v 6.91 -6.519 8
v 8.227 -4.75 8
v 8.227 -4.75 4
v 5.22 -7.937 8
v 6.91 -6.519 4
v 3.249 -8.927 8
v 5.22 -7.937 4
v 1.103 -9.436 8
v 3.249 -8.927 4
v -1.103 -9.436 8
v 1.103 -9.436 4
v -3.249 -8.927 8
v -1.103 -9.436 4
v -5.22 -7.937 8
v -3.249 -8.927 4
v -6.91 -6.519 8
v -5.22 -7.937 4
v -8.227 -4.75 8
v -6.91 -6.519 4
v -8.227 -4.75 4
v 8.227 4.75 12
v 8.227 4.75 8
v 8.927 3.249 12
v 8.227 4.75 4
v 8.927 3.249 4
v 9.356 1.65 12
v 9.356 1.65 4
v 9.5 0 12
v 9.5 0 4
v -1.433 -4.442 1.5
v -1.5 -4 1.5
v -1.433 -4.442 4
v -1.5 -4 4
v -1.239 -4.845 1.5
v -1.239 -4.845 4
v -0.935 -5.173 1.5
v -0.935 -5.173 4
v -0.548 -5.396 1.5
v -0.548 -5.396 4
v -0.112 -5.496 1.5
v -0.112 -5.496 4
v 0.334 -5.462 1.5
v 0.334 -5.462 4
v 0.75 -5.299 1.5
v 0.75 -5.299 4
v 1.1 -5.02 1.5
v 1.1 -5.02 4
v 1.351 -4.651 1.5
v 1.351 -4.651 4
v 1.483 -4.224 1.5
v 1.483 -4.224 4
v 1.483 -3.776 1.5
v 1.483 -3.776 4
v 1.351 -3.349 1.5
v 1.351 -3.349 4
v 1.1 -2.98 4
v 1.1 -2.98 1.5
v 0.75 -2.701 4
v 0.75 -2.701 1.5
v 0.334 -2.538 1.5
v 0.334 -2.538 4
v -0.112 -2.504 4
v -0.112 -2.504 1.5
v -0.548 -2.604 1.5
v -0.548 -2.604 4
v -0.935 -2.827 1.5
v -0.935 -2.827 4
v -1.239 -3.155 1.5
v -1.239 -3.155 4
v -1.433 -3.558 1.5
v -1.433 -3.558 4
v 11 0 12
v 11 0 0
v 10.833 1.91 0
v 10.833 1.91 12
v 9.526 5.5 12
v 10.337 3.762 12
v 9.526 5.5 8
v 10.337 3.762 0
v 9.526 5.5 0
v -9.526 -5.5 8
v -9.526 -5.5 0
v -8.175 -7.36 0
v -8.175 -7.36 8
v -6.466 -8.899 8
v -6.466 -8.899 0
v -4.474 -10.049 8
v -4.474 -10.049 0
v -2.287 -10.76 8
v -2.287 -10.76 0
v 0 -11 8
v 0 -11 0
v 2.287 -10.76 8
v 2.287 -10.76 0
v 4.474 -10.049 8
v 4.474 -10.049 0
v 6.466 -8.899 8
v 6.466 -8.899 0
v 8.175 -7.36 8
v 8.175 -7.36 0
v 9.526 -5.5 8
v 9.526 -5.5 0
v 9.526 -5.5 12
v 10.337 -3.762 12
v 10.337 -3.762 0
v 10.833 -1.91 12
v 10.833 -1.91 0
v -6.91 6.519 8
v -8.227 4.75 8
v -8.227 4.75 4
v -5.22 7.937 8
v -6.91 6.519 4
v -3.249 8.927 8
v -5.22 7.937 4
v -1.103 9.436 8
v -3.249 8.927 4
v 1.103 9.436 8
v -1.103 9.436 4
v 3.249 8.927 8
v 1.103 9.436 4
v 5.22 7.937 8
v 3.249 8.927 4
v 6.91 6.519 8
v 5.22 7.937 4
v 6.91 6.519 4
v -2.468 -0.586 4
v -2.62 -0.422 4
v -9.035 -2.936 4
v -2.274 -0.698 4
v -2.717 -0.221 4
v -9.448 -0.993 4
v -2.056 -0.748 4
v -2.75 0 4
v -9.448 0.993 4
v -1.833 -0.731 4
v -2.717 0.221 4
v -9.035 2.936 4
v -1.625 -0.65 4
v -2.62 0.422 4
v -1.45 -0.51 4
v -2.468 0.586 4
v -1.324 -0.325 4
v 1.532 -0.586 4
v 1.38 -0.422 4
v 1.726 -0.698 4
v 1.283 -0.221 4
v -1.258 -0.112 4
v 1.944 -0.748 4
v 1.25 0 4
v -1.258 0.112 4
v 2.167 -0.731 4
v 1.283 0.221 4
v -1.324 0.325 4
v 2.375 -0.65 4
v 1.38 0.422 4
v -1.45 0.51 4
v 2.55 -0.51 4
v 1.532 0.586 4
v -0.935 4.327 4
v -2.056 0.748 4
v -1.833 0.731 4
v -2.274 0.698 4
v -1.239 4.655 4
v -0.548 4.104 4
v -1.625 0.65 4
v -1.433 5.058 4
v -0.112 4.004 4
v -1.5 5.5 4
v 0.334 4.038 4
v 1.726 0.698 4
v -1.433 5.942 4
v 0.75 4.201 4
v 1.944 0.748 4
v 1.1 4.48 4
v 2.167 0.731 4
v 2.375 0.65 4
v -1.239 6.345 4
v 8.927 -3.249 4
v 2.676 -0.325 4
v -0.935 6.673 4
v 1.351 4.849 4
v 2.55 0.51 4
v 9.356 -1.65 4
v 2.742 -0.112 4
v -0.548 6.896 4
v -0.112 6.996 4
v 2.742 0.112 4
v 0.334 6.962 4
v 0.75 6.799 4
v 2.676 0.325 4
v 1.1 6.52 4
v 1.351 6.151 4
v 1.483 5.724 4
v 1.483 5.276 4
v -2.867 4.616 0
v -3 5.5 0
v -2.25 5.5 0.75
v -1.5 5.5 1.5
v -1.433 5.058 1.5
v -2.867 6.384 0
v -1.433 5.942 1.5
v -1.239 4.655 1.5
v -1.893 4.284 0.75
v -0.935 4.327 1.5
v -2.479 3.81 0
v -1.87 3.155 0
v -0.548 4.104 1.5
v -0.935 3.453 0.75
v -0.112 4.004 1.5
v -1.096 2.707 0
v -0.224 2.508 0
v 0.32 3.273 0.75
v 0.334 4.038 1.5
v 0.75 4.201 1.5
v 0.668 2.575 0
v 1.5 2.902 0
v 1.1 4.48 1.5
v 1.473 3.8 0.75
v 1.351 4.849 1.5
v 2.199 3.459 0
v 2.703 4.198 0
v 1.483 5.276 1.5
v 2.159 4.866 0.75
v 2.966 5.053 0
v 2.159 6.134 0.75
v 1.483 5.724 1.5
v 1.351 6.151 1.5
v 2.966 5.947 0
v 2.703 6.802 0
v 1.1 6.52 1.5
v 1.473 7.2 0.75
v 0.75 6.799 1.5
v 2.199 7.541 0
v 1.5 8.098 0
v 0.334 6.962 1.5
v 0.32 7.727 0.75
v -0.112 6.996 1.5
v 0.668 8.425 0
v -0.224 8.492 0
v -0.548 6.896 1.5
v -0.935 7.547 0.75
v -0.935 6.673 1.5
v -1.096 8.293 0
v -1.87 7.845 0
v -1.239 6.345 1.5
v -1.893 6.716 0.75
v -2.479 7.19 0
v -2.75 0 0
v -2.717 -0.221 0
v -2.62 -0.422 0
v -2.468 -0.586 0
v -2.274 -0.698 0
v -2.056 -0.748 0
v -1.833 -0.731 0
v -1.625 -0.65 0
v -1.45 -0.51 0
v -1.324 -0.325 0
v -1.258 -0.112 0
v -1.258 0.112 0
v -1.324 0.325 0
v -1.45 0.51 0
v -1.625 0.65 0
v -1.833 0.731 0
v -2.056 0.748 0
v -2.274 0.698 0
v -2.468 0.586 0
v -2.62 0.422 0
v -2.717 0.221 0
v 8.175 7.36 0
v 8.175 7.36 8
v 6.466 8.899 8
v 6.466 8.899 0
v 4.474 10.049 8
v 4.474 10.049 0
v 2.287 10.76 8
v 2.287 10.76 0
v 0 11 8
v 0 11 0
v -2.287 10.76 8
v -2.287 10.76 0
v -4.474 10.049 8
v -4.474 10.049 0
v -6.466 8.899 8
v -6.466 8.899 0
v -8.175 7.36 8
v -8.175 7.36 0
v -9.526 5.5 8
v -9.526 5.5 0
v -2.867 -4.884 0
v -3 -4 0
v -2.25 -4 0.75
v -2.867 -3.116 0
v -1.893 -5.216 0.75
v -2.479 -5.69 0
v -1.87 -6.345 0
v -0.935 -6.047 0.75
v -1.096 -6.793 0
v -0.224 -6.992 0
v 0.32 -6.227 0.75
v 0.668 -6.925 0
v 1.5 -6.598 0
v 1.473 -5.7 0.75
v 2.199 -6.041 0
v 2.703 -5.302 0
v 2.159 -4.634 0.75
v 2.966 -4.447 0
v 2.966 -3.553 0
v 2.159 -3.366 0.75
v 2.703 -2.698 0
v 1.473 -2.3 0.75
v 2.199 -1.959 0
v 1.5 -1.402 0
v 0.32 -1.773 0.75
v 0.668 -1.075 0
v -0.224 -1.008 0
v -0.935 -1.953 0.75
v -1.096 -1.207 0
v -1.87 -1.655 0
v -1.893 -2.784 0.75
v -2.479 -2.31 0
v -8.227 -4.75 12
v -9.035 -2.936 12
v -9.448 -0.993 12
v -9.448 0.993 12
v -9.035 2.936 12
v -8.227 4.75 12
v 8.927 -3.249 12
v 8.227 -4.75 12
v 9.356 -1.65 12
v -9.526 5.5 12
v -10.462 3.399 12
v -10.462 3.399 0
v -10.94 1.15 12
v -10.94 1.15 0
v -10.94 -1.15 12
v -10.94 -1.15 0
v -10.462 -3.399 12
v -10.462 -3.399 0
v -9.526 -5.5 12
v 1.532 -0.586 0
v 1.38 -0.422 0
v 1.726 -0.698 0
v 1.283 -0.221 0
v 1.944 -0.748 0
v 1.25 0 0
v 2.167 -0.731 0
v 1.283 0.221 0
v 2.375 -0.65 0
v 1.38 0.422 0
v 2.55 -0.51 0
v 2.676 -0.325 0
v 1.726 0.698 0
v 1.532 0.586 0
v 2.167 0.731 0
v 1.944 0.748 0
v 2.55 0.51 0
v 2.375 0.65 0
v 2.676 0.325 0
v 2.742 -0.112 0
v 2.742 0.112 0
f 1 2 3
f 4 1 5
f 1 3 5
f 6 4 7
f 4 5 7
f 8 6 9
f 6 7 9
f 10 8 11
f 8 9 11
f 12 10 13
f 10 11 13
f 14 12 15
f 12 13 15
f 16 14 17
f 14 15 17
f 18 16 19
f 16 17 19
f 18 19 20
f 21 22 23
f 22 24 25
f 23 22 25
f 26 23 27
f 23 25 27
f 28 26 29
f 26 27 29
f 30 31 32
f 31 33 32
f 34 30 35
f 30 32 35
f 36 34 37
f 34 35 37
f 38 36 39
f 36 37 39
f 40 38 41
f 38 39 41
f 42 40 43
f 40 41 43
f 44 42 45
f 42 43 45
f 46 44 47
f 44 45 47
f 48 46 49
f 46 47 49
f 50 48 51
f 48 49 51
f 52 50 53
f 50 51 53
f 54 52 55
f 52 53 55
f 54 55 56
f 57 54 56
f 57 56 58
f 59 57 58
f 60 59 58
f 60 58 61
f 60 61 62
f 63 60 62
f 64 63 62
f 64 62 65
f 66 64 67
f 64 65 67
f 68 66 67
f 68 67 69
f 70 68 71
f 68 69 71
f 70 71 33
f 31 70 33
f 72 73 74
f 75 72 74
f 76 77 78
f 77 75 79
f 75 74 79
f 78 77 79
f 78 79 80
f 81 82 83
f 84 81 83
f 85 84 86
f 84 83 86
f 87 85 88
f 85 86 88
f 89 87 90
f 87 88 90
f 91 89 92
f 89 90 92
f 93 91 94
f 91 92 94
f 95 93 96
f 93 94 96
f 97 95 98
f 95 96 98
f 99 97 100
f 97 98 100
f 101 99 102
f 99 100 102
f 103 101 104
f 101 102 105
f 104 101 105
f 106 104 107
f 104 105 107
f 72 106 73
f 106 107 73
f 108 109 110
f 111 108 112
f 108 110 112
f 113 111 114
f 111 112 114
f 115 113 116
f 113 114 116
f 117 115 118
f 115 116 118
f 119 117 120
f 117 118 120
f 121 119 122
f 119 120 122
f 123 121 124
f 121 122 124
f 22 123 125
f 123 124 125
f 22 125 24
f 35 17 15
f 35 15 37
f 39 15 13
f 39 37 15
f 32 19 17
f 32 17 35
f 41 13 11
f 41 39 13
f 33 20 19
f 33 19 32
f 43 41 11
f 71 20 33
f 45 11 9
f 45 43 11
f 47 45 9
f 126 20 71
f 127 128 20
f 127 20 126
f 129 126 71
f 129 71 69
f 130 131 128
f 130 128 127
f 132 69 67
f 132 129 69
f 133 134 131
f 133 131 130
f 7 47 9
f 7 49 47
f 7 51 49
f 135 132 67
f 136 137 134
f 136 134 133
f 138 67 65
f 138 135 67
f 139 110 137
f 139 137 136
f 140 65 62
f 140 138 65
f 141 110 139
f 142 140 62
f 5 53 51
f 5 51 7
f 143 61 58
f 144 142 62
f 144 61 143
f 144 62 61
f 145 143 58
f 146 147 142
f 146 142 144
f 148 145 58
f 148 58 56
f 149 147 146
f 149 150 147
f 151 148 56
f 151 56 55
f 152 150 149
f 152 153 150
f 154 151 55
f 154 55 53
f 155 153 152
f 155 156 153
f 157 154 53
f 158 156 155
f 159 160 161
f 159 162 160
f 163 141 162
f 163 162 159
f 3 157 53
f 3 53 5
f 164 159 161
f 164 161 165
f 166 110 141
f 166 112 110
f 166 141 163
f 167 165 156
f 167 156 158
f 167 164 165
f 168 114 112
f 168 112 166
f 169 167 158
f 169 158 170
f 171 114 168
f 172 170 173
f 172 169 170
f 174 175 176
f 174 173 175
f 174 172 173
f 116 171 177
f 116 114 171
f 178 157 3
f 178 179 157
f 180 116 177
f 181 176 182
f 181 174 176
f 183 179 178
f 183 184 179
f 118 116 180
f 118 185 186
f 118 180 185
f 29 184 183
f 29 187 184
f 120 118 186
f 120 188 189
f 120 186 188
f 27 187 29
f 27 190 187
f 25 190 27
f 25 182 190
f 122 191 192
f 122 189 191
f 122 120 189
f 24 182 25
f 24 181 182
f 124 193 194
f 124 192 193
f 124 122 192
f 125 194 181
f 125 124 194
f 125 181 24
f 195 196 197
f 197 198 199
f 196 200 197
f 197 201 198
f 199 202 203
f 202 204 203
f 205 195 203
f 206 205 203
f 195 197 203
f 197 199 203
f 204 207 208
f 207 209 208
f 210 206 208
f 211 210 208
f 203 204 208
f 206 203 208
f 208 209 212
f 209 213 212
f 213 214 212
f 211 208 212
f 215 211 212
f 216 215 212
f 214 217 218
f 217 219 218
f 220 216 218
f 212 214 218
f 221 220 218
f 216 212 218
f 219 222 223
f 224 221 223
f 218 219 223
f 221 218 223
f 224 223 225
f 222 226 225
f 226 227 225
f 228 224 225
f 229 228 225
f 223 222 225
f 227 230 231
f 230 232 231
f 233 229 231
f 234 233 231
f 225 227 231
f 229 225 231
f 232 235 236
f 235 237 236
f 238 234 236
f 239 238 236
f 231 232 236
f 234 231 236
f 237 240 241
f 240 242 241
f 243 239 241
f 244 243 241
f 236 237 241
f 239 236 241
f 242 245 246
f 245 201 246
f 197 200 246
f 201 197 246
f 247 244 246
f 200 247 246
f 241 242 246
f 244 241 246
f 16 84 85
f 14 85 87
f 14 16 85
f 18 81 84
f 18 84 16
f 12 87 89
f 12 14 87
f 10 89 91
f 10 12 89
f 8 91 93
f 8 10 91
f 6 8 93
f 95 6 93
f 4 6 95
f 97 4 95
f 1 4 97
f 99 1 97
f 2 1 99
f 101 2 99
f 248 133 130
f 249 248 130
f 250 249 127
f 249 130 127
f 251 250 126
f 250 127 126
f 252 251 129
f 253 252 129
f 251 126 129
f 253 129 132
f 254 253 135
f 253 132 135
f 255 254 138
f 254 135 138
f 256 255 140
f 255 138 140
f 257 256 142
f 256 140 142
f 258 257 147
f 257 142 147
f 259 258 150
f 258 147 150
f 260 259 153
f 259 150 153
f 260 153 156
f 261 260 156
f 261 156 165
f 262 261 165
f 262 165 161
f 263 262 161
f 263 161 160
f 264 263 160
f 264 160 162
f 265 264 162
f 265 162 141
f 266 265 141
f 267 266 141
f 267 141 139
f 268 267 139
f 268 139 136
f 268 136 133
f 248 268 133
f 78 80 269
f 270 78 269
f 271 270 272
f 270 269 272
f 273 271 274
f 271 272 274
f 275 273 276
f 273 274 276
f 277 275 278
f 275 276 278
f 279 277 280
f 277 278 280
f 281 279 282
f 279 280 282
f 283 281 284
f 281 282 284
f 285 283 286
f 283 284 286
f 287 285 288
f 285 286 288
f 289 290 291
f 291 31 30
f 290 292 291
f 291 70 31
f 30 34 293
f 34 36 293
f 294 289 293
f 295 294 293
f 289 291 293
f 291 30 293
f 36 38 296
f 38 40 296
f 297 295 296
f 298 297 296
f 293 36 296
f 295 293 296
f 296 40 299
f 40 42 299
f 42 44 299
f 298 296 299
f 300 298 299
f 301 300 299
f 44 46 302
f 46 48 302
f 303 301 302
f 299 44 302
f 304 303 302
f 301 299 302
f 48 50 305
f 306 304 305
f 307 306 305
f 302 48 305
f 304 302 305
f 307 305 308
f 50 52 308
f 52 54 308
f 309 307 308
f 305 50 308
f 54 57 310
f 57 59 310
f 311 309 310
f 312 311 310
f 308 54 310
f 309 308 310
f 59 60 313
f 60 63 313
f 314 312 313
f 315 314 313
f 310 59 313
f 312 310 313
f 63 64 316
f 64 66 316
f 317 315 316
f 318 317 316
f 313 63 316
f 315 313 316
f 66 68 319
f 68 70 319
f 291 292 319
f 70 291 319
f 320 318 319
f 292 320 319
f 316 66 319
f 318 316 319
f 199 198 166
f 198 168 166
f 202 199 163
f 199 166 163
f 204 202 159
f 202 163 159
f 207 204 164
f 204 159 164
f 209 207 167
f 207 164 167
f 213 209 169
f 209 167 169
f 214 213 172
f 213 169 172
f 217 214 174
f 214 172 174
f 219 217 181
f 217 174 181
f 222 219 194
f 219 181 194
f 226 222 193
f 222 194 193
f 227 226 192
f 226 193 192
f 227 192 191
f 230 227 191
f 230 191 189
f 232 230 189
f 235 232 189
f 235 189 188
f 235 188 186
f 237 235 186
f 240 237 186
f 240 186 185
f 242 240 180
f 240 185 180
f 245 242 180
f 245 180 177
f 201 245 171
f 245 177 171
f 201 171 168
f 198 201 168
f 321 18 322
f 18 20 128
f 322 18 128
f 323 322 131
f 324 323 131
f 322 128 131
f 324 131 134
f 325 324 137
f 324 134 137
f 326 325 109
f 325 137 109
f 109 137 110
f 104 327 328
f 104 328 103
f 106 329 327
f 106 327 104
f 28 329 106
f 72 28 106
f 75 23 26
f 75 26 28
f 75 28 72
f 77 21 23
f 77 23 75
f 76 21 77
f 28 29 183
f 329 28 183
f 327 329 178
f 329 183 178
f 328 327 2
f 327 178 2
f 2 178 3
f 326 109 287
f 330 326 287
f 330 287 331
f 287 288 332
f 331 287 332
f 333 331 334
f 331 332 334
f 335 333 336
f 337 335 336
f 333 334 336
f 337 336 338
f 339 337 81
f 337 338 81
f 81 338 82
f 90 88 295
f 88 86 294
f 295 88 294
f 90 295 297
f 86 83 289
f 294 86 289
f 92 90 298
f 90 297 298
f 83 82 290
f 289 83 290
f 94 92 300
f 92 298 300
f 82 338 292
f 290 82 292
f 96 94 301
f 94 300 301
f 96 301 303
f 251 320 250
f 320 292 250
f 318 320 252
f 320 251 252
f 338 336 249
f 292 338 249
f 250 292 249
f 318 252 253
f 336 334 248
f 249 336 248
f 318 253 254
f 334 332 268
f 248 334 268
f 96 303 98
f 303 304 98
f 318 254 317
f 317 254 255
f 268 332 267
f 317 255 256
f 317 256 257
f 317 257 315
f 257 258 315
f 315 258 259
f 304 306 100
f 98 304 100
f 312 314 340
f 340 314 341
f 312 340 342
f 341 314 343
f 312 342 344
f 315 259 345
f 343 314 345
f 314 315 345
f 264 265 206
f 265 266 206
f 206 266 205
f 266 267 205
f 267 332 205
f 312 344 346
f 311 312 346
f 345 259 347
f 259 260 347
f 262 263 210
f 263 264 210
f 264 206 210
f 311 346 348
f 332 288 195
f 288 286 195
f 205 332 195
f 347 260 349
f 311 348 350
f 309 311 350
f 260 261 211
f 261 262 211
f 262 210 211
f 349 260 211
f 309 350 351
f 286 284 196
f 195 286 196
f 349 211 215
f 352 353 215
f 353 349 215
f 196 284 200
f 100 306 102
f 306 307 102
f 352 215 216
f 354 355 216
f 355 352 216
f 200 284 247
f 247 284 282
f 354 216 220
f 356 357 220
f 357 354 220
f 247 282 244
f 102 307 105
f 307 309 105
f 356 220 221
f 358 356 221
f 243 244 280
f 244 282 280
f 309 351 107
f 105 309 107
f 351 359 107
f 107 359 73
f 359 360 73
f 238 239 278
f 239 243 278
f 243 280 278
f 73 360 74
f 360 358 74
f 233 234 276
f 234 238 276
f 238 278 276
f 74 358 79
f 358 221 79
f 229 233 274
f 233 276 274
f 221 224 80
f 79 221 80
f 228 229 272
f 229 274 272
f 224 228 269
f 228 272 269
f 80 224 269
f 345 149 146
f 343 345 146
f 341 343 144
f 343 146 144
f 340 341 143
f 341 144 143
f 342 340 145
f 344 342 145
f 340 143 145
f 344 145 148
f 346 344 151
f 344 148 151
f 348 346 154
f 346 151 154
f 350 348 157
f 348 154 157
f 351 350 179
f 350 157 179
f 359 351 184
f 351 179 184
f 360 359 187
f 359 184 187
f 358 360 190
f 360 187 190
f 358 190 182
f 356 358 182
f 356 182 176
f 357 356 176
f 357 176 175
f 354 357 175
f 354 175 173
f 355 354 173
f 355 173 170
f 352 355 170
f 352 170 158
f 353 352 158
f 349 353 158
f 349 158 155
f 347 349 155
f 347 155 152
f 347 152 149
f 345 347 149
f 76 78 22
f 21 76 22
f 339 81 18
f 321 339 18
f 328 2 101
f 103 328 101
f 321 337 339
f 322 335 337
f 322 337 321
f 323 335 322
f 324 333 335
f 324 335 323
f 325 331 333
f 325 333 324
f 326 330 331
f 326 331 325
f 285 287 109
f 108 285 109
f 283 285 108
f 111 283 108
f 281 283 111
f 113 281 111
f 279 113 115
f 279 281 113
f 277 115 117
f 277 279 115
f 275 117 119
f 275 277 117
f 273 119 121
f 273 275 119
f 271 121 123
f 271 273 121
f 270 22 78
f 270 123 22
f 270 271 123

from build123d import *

# Parameters (mm, degrees)
F1_DEPTH       = 8
F2_DEPTH       = 4
F3_D           = 1.5
F4_DEPTH       = 12
F5_D           = 3
F5_CSINK_D     = 6
F5_CSINK_ANGLE = 90


with BuildPart() as f1:
    # F0 (on Top) → F1 (new body)
    with BuildSketch(Plane.XY):
        with BuildLine():
            Line((8.227241336, 4.75), (9.5262794416, 5.5))
            ThreePointArc((9.5262794416, 5.5), (0, 11), (-9.5262794416, 5.5))
            Line((-9.5262794416, 5.5), (-8.227241336, 4.75))
            ThreePointArc((-8.227241336, 4.75), (0, 9.5), (8.227241336, 4.75))
        make_face()
    extrude(amount=F1_DEPTH)



with BuildPart() as f1b:
    # F0 (on Top) → F1, piece 2 (new body)
    with BuildSketch(Plane.XY):
        with BuildLine():
            ThreePointArc((-9.5262794416, -5.5), (0, -11), (9.5262794416, -5.5))
            Line((9.5262794416, -5.5), (8.227241336, -4.75))
            ThreePointArc((8.227241336, -4.75), (0, -9.5), (-8.227241336, -4.75))
            Line((-8.227241336, -4.75), (-9.5262794416, -5.5))
        make_face()
    extrude(amount=F1_DEPTH)


with BuildPart() as f1_1:
    add(f1.part)

    add(f1b.part)  # F2 merges F1b
    # F0 (on Top) → F2 (join)
    with BuildSketch(Plane.XY):
        with BuildLine():
            ThreePointArc((9.5, 0), (9.1762953497, 2.4587809285), (8.227241336, 4.75))
            ThreePointArc((8.227241336, 4.75), (0, 9.5), (-8.227241336, 4.75))
            ThreePointArc((-8.227241336, 4.75), (-9.5, 0), (-8.227241336, -4.75))
            ThreePointArc((-8.227241336, -4.75), (0, -9.5), (8.227241336, -4.75))
            ThreePointArc((8.227241336, -4.75), (9.1762953497, -2.4587809285), (9.5, 0))
        make_face()
    extrude(amount=F2_DEPTH)

    # F3 (through all)
    with Locations(Plane(origin=(0, 0, 0), x_dir=(1, 0, 0), z_dir=(0, 0, -1))):
        with Locations((2, 0), (-2, 0)):
            Hole(F3_D / 2)

    # F0 (on Top) → F4 (join)
    with BuildSketch(Plane.XY):
        with BuildLine():
            Line((-8.227241336, 4.75), (-9.5262794416, 5.5))
            ThreePointArc((-9.5262794416, 5.5), (-11, 0), (-9.5262794416, -5.5))
            Line((-9.5262794416, -5.5), (-8.227241336, -4.75))
            ThreePointArc((-8.227241336, -4.75), (-9.5, 0), (-8.227241336, 4.75))
        make_face()
        with BuildLine():
            ThreePointArc((9.5262794416, -5.5), (10.6251840892, -2.8470094961), (11, 0))
            ThreePointArc((11, 0), (10.6251840892, 2.8470094961), (9.5262794416, 5.5))
            Line((9.5262794416, 5.5), (8.227241336, 4.75))
            ThreePointArc((8.227241336, 4.75), (9.1762953497, 2.4587809285), (9.5, 0))
            ThreePointArc((9.5, 0), (9.1762953497, -2.4587809285), (8.227241336, -4.75))
            Line((8.227241336, -4.75), (9.5262794416, -5.5))
        make_face()
    extrude(amount=F4_DEPTH)

    # F5 (through all)
    with Locations(Plane(origin=(0, 0, 0), x_dir=(1, 0, 0), z_dir=(0, 0, -1))):
        with Locations((0, 4), (0, -5.5)):
            CounterSinkHole(F5_D / 2, F5_CSINK_D / 2, counter_sink_angle=F5_CSINK_ANGLE)


solid = f1_1.part
